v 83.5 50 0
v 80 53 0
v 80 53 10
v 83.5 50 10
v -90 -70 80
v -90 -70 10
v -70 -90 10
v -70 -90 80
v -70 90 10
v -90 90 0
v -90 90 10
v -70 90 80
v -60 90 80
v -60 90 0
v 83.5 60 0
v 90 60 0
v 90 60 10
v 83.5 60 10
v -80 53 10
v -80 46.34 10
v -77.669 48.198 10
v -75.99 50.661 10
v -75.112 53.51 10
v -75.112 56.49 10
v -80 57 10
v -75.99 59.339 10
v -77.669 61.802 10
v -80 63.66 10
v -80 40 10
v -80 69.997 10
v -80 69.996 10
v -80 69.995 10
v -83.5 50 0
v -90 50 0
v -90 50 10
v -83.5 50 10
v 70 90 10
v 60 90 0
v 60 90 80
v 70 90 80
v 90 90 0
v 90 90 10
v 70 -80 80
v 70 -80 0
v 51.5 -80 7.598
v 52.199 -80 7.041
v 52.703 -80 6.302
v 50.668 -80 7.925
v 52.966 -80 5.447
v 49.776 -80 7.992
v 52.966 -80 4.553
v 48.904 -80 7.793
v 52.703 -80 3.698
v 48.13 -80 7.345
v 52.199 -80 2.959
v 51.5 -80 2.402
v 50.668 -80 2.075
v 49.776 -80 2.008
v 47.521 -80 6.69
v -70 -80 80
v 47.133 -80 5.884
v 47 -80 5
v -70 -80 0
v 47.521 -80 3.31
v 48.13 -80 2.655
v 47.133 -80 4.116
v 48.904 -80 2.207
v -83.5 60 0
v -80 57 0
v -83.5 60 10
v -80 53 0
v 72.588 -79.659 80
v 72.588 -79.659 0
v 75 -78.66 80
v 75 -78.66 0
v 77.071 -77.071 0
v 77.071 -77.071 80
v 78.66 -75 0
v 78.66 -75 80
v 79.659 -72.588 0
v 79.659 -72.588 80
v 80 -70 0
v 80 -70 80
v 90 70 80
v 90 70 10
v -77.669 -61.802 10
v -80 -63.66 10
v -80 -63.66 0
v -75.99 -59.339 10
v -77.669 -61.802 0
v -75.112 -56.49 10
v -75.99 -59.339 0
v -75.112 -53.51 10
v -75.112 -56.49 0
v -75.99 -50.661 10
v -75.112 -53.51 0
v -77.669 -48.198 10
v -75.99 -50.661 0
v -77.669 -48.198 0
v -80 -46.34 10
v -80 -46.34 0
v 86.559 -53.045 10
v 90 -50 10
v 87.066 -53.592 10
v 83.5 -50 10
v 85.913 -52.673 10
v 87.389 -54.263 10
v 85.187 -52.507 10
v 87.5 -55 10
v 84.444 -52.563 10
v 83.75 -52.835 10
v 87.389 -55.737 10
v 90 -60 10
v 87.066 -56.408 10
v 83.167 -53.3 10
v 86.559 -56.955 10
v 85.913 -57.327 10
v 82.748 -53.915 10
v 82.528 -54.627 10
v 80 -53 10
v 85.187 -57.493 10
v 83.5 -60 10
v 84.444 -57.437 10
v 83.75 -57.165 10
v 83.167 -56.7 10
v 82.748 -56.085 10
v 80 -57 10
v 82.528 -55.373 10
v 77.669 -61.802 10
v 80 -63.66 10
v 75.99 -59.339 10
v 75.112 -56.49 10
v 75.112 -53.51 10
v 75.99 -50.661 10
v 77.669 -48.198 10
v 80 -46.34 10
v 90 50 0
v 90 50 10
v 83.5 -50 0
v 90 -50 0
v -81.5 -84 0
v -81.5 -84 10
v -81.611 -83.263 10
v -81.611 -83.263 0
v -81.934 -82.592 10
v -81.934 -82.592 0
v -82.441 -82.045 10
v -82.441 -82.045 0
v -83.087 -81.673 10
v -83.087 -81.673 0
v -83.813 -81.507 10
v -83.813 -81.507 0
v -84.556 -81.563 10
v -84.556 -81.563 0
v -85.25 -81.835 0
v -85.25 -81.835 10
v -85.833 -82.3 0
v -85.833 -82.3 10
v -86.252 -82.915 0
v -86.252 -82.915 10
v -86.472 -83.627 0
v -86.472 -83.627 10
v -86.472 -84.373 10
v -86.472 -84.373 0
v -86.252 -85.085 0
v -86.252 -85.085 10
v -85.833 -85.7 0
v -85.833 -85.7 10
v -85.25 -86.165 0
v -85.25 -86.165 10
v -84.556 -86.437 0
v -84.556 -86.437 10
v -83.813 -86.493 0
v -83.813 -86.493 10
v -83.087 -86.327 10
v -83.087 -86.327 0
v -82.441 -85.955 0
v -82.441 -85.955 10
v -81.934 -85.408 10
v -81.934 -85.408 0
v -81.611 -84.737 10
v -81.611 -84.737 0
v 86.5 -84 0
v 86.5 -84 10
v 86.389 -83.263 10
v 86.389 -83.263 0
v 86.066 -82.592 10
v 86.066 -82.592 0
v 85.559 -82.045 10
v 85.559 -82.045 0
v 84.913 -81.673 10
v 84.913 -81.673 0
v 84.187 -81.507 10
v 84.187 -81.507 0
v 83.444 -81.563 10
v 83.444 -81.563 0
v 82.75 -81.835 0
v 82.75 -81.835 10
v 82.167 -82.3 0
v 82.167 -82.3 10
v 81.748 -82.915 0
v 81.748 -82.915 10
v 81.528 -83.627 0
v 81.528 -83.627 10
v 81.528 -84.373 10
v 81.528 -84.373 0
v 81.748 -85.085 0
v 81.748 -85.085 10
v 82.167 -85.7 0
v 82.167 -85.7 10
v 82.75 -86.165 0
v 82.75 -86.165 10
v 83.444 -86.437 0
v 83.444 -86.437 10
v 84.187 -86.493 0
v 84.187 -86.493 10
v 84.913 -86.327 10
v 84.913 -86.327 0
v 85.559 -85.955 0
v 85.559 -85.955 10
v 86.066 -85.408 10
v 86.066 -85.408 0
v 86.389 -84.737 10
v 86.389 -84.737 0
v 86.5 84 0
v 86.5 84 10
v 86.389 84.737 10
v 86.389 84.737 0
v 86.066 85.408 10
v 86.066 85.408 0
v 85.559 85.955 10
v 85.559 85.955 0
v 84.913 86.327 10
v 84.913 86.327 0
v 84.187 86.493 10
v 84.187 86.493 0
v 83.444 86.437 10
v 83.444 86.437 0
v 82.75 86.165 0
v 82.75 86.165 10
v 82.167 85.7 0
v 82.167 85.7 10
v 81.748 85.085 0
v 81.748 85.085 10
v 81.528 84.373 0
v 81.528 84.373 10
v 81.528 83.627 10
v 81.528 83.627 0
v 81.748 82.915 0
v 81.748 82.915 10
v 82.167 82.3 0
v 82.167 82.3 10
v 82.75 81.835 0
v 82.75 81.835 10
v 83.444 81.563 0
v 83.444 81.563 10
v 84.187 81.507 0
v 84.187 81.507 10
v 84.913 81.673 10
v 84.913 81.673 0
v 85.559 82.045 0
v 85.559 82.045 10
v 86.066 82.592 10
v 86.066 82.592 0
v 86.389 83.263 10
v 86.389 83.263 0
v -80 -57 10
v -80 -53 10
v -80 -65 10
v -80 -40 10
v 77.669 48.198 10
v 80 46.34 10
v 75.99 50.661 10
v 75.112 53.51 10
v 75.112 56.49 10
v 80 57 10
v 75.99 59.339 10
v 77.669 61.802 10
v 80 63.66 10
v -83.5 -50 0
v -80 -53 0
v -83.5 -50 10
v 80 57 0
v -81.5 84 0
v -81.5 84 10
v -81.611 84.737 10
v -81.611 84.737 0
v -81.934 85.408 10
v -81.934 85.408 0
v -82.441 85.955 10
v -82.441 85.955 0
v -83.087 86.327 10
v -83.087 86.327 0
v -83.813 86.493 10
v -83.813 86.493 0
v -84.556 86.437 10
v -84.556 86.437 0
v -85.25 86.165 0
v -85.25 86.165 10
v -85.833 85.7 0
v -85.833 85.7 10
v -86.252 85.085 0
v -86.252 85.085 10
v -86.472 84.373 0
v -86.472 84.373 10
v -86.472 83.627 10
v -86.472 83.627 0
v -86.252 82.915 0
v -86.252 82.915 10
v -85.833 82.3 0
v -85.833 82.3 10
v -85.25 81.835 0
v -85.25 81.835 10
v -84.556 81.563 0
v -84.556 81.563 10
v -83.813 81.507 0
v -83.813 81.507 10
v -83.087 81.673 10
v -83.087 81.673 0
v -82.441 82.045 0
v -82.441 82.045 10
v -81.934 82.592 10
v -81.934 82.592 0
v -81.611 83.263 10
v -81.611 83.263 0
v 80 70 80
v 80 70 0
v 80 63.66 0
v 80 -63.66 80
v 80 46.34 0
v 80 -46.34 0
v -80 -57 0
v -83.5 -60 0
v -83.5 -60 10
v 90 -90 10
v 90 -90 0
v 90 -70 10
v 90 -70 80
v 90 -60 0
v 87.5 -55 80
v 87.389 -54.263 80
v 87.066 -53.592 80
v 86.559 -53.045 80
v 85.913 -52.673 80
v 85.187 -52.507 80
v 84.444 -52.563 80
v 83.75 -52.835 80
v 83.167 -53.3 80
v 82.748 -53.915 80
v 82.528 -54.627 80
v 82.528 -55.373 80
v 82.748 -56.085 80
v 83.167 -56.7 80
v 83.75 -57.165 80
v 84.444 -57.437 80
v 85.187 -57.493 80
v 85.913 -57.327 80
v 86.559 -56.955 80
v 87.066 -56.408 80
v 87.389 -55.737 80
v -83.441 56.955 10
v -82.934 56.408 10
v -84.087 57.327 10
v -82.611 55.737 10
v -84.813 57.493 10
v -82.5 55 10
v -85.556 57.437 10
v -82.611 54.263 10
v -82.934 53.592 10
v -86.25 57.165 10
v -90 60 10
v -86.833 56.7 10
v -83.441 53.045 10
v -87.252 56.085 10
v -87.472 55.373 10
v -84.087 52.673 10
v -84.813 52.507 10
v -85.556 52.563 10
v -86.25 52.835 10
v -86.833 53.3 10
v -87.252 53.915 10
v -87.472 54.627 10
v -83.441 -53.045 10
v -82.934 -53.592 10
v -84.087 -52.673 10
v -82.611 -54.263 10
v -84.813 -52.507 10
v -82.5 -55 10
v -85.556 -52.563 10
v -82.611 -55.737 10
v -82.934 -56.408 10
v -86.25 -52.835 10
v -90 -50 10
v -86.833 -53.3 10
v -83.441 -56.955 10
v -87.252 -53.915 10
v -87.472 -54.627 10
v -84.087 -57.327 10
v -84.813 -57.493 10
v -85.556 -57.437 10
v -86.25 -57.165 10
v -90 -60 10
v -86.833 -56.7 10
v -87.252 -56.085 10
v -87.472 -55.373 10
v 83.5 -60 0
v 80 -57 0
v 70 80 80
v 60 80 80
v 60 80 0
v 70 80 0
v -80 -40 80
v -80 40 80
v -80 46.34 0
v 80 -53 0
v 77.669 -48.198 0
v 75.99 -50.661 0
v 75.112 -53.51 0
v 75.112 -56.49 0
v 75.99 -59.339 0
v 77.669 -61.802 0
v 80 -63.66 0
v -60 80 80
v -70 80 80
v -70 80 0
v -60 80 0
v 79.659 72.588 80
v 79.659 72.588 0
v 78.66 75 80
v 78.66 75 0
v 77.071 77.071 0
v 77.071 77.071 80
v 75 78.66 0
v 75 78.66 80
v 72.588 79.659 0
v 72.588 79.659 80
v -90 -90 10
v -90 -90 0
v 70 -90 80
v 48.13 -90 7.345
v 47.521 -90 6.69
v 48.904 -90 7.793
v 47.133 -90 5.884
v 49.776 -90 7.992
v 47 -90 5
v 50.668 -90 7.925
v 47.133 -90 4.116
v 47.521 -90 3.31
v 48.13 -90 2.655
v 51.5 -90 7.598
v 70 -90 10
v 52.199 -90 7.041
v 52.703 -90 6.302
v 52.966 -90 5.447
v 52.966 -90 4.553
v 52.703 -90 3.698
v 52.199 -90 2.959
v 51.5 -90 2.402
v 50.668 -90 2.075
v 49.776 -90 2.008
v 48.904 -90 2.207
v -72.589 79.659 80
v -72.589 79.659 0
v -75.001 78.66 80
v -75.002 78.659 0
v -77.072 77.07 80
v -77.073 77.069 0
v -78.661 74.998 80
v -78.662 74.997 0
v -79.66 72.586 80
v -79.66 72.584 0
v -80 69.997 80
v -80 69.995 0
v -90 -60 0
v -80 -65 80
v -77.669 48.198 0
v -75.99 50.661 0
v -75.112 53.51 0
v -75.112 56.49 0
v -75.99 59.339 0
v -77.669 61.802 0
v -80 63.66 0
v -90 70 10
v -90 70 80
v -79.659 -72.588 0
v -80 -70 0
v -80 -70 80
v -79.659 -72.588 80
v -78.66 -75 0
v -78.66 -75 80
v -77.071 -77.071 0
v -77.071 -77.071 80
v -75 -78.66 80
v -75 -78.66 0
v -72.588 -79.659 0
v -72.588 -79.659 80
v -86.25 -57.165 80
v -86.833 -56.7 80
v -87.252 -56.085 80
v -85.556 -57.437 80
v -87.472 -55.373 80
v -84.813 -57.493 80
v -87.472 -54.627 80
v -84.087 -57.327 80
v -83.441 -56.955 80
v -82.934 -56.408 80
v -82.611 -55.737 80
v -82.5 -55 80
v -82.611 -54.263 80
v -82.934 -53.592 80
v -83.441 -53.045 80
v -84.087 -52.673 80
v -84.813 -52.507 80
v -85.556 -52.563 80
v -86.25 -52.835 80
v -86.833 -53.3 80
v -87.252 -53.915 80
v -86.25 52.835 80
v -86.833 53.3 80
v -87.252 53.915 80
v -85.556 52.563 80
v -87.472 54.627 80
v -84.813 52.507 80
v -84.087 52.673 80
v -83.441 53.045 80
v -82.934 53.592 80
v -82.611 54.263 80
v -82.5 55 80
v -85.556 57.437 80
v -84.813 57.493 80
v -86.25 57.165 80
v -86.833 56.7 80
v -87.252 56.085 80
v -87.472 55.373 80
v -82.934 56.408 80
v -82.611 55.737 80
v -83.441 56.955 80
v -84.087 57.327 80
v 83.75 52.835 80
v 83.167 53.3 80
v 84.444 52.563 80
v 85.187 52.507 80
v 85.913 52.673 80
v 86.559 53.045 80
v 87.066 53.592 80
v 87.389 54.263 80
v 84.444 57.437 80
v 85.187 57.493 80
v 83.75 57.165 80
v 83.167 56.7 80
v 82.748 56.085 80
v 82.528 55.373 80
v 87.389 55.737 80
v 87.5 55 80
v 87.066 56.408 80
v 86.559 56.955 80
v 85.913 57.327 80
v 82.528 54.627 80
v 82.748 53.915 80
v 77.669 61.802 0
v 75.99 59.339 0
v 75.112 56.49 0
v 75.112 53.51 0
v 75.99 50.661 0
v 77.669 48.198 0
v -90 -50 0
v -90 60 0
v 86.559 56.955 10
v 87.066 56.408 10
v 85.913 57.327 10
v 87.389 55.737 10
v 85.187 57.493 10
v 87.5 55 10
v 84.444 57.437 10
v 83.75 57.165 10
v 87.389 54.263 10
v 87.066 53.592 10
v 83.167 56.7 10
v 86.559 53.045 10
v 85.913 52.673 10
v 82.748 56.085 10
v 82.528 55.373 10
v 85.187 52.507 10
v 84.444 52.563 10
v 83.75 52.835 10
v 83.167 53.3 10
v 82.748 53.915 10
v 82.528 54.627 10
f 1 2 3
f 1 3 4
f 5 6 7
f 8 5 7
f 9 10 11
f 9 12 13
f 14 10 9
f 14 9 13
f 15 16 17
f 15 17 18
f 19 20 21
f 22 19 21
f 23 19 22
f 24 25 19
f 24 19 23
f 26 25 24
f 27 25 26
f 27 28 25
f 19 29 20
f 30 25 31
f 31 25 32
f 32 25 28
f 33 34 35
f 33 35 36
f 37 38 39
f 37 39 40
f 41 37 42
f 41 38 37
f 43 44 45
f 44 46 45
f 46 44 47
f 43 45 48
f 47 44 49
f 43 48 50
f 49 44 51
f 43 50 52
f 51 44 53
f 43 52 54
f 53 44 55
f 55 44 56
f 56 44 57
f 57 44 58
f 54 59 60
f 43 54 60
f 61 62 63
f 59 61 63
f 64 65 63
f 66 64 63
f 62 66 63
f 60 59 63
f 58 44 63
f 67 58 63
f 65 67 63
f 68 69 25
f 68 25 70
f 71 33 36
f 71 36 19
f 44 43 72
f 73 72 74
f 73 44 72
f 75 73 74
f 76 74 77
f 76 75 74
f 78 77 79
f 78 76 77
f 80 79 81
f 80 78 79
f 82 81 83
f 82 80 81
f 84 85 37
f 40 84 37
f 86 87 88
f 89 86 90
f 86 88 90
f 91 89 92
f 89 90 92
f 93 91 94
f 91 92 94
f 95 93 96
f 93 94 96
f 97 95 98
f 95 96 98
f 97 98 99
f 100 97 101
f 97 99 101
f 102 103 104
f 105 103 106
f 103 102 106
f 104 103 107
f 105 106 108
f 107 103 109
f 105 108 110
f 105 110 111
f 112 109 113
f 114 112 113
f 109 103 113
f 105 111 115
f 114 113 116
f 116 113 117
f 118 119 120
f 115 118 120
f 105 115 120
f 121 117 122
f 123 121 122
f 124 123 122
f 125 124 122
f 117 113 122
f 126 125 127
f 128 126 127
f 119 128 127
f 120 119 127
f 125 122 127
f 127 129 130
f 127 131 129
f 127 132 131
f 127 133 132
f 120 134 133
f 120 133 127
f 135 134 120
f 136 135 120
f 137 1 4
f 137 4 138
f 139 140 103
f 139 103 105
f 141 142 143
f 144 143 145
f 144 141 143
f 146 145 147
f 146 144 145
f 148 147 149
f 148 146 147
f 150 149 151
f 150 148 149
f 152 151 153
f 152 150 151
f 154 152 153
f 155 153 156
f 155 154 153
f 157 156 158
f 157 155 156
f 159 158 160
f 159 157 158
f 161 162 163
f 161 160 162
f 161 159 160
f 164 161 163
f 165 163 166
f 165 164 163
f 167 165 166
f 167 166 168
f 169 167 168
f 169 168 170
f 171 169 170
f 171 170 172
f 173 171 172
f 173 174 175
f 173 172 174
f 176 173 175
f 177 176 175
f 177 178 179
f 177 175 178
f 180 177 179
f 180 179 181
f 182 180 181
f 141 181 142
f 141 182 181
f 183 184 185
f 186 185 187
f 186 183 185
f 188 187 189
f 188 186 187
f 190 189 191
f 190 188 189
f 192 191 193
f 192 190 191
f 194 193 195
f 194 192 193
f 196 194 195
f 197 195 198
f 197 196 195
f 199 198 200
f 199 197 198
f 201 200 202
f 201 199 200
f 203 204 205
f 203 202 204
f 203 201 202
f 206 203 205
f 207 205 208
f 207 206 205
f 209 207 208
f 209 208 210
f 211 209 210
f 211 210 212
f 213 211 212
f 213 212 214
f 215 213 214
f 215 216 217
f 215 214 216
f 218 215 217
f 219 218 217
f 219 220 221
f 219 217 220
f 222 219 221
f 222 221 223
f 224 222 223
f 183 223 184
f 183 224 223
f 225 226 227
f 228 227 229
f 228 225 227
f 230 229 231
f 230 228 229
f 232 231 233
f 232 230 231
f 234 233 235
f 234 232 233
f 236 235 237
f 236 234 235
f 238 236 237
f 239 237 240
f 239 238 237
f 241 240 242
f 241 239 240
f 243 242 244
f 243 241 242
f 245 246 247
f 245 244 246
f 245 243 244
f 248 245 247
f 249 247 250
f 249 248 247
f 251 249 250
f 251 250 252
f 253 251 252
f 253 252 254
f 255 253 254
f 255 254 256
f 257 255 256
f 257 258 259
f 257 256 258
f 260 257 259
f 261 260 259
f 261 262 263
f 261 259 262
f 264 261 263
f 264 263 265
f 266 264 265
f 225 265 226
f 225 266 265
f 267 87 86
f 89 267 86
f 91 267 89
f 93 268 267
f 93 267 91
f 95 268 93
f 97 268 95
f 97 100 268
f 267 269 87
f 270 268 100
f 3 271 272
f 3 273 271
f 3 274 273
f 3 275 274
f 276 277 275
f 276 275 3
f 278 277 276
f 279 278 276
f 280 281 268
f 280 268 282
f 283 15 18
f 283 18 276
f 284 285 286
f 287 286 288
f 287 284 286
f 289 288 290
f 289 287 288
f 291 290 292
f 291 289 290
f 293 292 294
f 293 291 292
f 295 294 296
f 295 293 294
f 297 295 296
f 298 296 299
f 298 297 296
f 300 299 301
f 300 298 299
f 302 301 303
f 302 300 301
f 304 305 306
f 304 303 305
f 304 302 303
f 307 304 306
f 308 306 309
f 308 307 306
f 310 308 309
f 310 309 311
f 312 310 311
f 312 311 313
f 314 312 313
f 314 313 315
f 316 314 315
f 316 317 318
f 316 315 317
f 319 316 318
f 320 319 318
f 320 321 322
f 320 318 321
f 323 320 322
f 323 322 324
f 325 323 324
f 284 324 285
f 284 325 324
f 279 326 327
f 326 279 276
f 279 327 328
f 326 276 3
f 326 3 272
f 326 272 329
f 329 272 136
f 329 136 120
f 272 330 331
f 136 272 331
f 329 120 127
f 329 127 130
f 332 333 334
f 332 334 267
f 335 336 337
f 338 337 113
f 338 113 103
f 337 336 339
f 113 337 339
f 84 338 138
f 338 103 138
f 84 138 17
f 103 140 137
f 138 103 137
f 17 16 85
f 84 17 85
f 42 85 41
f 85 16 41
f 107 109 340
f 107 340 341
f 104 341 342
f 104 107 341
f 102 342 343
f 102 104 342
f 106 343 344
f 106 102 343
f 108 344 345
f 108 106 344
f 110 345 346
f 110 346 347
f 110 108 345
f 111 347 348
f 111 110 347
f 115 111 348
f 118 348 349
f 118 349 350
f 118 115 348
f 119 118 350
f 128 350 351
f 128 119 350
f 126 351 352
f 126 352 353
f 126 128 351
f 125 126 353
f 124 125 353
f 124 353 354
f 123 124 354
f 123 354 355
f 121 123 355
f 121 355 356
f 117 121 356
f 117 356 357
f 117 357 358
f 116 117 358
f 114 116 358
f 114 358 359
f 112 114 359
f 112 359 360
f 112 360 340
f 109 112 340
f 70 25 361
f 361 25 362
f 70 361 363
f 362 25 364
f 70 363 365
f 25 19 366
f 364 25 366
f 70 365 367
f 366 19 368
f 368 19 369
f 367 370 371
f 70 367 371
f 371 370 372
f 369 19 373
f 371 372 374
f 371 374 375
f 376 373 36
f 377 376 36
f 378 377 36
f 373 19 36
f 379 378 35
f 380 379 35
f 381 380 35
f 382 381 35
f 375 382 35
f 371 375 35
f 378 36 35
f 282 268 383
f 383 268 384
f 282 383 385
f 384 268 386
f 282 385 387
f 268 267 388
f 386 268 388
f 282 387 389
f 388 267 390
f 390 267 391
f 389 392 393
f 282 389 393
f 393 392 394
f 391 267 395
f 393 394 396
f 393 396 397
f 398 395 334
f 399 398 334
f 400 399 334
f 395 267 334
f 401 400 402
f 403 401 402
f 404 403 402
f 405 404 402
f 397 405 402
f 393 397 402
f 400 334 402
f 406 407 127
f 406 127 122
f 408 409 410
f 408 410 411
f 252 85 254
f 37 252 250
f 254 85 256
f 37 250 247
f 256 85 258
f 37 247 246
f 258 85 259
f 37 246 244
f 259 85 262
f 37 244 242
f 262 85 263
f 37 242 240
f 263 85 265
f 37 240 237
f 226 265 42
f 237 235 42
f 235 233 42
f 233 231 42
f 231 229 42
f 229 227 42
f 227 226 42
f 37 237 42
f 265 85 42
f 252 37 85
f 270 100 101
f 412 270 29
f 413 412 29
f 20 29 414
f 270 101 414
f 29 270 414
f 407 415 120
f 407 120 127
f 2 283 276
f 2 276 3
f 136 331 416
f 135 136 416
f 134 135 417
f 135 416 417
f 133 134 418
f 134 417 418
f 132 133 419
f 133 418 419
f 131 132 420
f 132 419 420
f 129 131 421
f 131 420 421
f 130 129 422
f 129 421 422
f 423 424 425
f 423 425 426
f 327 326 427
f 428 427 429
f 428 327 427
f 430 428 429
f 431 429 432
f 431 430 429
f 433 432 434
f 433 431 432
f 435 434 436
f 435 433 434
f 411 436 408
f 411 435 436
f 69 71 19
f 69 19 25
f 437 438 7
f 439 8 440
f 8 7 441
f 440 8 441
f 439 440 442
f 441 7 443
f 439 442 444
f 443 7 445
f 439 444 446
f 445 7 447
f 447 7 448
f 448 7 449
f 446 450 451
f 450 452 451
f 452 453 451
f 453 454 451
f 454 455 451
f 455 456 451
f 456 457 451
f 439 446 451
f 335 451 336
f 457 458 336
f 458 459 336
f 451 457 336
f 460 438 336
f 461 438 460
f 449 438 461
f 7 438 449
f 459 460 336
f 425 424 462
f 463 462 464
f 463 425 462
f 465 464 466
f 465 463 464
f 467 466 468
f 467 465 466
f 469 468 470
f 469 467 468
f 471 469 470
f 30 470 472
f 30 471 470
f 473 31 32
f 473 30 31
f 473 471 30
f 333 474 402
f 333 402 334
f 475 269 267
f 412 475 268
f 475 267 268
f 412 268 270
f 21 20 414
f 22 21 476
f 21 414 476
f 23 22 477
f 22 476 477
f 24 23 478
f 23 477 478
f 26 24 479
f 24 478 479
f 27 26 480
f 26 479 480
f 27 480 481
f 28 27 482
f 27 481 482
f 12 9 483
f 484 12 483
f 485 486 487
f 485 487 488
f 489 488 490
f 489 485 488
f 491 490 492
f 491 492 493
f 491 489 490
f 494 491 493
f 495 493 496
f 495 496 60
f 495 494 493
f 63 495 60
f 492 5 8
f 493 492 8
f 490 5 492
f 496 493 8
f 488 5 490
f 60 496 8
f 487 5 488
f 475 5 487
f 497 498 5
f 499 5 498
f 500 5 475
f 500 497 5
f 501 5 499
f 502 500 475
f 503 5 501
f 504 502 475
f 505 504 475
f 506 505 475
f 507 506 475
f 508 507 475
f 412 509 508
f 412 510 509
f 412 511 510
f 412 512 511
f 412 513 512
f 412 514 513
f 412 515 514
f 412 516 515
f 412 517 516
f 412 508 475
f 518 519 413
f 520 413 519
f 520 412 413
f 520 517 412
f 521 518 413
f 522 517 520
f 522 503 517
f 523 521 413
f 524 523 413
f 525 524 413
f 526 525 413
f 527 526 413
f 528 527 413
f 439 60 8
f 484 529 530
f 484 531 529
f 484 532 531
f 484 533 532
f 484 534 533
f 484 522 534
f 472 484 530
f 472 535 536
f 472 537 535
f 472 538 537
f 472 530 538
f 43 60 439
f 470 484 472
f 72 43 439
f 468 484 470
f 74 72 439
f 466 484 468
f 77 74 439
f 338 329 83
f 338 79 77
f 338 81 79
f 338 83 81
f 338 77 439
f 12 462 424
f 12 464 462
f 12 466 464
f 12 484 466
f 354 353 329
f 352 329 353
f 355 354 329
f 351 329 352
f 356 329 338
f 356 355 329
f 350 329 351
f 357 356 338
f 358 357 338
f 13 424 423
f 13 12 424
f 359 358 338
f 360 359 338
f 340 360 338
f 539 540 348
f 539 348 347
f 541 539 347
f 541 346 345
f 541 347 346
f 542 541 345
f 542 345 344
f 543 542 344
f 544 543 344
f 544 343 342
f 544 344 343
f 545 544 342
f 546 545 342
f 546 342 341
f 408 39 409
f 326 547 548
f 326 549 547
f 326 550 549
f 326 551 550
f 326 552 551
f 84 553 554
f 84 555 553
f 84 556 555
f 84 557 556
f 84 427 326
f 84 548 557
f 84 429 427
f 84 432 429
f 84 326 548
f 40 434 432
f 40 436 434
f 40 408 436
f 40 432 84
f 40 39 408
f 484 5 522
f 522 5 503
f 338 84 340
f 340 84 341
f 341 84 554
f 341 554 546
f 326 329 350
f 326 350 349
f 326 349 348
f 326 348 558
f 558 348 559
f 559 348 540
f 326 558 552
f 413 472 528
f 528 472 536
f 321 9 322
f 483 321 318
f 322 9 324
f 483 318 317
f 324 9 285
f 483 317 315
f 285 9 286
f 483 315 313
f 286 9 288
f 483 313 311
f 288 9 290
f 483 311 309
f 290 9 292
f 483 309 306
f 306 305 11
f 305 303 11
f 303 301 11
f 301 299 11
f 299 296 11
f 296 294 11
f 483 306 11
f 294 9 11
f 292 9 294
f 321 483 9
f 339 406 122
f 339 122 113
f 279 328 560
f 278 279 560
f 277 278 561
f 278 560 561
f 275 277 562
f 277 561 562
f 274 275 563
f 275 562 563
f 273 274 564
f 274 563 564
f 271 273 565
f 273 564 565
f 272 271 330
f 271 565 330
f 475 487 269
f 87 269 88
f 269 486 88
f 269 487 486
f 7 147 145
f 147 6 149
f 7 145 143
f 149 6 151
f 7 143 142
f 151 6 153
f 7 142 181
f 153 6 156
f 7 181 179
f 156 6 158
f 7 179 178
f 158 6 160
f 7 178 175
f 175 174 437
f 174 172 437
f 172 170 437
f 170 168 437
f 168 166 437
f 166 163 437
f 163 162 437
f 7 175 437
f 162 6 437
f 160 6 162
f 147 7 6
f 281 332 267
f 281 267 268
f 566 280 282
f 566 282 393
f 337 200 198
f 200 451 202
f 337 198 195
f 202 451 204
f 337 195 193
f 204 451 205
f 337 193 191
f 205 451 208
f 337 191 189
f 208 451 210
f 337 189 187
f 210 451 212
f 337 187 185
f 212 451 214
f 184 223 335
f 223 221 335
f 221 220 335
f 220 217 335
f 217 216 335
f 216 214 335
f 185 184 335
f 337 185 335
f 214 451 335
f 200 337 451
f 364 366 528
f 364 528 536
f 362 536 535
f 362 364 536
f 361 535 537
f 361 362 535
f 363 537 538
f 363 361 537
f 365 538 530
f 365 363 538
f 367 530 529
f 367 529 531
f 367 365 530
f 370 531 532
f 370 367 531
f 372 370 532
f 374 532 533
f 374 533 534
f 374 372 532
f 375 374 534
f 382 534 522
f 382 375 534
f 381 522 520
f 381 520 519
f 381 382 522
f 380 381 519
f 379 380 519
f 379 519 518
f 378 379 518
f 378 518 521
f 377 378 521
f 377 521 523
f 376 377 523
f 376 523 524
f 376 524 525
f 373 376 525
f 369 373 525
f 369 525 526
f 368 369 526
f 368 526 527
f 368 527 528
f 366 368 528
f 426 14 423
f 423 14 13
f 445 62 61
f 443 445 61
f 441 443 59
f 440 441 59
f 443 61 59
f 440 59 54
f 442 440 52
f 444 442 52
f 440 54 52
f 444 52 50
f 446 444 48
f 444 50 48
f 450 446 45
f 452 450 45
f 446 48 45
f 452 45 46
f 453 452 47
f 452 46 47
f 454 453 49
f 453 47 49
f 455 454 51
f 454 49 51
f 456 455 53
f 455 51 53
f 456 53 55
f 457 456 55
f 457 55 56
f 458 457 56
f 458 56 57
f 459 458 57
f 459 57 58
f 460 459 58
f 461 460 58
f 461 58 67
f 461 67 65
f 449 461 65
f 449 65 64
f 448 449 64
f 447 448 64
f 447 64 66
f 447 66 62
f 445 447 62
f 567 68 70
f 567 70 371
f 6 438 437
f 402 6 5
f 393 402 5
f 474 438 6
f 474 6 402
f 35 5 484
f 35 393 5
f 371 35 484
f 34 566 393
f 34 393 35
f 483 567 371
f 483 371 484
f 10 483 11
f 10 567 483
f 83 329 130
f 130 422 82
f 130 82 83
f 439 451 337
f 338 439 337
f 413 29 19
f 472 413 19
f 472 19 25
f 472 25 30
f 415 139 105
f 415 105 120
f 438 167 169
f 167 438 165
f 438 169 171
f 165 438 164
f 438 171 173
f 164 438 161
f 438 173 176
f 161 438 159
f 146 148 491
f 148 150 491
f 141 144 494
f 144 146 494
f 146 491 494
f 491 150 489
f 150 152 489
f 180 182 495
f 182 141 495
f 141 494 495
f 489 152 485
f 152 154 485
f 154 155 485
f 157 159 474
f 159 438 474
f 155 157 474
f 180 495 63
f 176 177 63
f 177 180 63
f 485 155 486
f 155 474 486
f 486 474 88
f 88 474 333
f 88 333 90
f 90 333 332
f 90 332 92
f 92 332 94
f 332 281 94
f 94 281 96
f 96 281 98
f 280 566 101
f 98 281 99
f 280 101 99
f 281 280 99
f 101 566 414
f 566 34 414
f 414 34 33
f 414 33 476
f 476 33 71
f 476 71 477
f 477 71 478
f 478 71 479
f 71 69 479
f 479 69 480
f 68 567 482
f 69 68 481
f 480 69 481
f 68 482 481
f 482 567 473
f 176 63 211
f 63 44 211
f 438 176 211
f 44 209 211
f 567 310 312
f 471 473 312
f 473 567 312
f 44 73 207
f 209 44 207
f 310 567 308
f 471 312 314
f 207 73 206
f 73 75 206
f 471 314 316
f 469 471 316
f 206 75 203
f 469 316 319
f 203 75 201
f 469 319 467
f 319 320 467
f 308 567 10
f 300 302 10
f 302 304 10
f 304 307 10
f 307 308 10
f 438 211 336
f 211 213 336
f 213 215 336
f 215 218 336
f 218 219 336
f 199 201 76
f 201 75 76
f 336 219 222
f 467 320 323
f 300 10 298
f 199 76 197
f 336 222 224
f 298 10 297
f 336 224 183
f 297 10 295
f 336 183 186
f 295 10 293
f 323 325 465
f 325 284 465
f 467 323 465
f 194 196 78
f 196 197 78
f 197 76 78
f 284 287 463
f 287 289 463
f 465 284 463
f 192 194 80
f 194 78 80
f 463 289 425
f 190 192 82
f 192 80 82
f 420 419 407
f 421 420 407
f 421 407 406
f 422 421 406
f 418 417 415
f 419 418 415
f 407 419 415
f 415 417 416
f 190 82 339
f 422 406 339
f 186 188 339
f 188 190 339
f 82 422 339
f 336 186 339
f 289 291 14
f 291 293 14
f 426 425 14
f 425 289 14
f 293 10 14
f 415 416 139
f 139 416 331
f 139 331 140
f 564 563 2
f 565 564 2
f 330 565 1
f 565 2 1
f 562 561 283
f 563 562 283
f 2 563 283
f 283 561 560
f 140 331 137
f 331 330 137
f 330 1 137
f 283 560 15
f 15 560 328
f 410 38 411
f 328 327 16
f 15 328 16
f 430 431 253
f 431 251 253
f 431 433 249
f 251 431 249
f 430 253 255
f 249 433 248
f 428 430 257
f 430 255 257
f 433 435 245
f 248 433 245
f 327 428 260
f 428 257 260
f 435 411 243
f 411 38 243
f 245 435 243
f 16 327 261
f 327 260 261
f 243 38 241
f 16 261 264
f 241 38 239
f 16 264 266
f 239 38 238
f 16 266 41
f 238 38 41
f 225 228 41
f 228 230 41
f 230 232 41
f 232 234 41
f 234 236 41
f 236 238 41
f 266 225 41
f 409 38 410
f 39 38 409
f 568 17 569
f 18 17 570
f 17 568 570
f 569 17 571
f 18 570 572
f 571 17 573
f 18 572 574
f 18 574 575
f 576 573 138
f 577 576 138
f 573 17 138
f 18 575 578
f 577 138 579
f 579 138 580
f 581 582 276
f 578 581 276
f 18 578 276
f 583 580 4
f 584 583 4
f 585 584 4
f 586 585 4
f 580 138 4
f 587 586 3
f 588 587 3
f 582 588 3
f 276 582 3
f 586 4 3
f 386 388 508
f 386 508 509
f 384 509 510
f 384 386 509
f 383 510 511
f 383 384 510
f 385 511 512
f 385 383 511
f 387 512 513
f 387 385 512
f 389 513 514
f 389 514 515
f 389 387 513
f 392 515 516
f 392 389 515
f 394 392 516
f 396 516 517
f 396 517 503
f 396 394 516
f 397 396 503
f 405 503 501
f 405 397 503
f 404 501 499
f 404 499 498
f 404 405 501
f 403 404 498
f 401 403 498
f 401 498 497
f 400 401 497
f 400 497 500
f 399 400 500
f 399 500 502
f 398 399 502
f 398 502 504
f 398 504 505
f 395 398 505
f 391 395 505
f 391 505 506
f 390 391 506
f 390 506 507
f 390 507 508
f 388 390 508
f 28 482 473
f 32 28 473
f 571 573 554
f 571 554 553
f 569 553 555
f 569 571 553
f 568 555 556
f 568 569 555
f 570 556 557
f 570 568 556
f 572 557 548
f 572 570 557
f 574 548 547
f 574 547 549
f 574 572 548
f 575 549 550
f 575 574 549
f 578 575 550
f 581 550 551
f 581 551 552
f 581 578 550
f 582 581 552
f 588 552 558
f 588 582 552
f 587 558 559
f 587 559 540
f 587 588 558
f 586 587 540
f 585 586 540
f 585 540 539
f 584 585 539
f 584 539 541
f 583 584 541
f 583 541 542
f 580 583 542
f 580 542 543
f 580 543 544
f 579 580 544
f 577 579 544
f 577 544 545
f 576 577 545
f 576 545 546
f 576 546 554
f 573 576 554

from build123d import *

# Parameters (mm, degrees)
SKETCH_W           = 180
SKETCH_H           = 180
SKETCH_R           = 2.5
PAD_DEPTH          = 80
SKETCH001_W        = 120
SKETCH001_H        = 80
POCKET_DEPTH       = 11
POCKET002_DEPTH    = 70
POLARPATTERN_COUNT = 4
POCKET003_DEPTH    = 10
SKETCH005_W        = 10
SKETCH005_H        = 30
SKETCH005_H_2      = 25
POCKET004_DEPTH    = 70
SKETCH002_R        = 3
POCKET007_DEPTH    = 11


with BuildPart() as part:
    # Sketch (on Sketch) → Pad (new body)
    with BuildSketch(Plane.XY):
        Rectangle(SKETCH_W, SKETCH_H)
        with Locations((-84, 84)):
            Circle(SKETCH_R, mode=Mode.SUBTRACT)
        with Locations((84, 84)):
            Circle(SKETCH_R, mode=Mode.SUBTRACT)
        with Locations((84, -84)):
            Circle(SKETCH_R, mode=Mode.SUBTRACT)
        with Locations((-84, -84)):
            Circle(SKETCH_R, mode=Mode.SUBTRACT)
        with Locations((-85, 55)):
            Circle(SKETCH_R, mode=Mode.SUBTRACT)
        with Locations((-85, -55)):
            Circle(SKETCH_R, mode=Mode.SUBTRACT)
        with Locations((85, -55)):
            Circle(SKETCH_R, mode=Mode.SUBTRACT)
        with Locations((85, 55)):
            Circle(SKETCH_R, mode=Mode.SUBTRACT)
        with BuildLine():
            Line((-70, 80), (70, 80))
            ThreePointArc((80, 70), (77.071068, 77.071068), (70, 80))
            Line((80, 70), (80, 63.660254))
            ThreePointArc((80, 63.660254), (75, 55), (80, 46.339746))
            Line((80, 46.339746), (80, -46.339746))
            ThreePointArc((80, -46.339746), (75, -55), (80, -63.660254))
            Line((80, -63.660254), (80.000001, -70))
            ThreePointArc((70.000001, -80), (77.071069, -77.071068), (80.000001, -70))
            Line((70.000001, -80), (-69.999999, -80))
            ThreePointArc((-79.999999, -70), (-77.071066, -77.071068), (-69.999999, -80))
            Line((-79.999999, -70), (-79.999999, -63.660253))
            ThreePointArc((-79.999999, -63.660253), (-75, -55), (-79.999999, -46.339747))
            Line((-79.999999, -46.339747), (-79.999999, 46.339747))
            ThreePointArc((-79.999999, 46.339747), (-75, 55), (-79.999999, 63.660253))
            Line((-79.999999, 63.660253), (-79.999999, 69.994765))
            ThreePointArc((-70, 80), (-77.072918, 77.069217), (-79.999999, 69.994765))
        make_face(mode=Mode.SUBTRACT)
    extrude(amount=PAD_DEPTH)

    # Sketch001 (on Face1 of Pad) → Pocket (cut)
    with BuildSketch(Plane(origin=(0, 90, 0), x_dir=(-1, 0, 0), z_dir=(0, 1, 0))):
        with Locations((0, 40)):
            Rectangle(SKETCH001_W, SKETCH001_H)
    extrude(amount=-POCKET_DEPTH, mode=Mode.SUBTRACT)

    # Sketch003 → Pocket002 (cut)
    with BuildSketch(Plane.XY.offset(80)):
        Polygon((-90, 90), (-70, 90), (-90, 70), align=None)
    pocket002 = extrude(amount=-POCKET002_DEPTH, mode=Mode.SUBTRACT)

    # PolarPattern: Pocket002 ×4 about axis
    polarpattern_axis = Axis((0, 0, 80), (0, 0, 1))
    for i in range(1, POLARPATTERN_COUNT):
        add(pocket002.rotate(polarpattern_axis, i * 360 / POLARPATTERN_COUNT), mode=Mode.SUBTRACT)

    # Sketch004 (on Face2 of PolarPattern) → Pocket003 (cut)
    with BuildSketch(Plane(origin=(0, 0, 0), x_dir=(1, 0, 0), z_dir=(0, 0, -1))):
        Polygon((-90, 60), (-83.5, 60), (-80, 57), (-80, 53), (-83.5, 50), (-90, 50), align=None)
        Polygon((83.5, 60), (90, 60), (90, 50), (83.5, 50), (80, 53), (80, 57), align=None)
        Polygon((83.5, -50), (90, -50), (90, -60), (83.5, -60), (80, -57), (80, -53), align=None)
        Polygon((-90, -50), (-83.5, -50), (-80, -53), (-80, -57), (-83.5, -60), (-90, -60), align=None)
    extrude(amount=-POCKET003_DEPTH, mode=Mode.SUBTRACT)

    # Sketch005 (on Face6 of Pocket003) → Pocket004 (cut)
    with BuildSketch(Plane.XY.offset(10)):
        with Locations((-75, 55)):
            Rectangle(SKETCH005_W, SKETCH005_H)
        with Locations((75, 55)):
            Rectangle(SKETCH005_W, SKETCH005_H)
        with Locations((75, -55)):
            Rectangle(SKETCH005_W, SKETCH005_H)
        with Locations((-75, -52.5)):
            Rectangle(SKETCH005_W, SKETCH005_H_2)
    extrude(amount=POCKET004_DEPTH, mode=Mode.SUBTRACT)

    # Sketch002 (on Face30 of Pocket004) → Pocket007 (cut)
    with BuildSketch(Plane(origin=(0, -80, 0), x_dir=(-1, 0, 0), z_dir=(0, 1, 0))):
        with Locations((-50, 5)):
            Circle(SKETCH002_R)
    extrude(amount=-POCKET007_DEPTH, mode=Mode.SUBTRACT)


solid = part.part
